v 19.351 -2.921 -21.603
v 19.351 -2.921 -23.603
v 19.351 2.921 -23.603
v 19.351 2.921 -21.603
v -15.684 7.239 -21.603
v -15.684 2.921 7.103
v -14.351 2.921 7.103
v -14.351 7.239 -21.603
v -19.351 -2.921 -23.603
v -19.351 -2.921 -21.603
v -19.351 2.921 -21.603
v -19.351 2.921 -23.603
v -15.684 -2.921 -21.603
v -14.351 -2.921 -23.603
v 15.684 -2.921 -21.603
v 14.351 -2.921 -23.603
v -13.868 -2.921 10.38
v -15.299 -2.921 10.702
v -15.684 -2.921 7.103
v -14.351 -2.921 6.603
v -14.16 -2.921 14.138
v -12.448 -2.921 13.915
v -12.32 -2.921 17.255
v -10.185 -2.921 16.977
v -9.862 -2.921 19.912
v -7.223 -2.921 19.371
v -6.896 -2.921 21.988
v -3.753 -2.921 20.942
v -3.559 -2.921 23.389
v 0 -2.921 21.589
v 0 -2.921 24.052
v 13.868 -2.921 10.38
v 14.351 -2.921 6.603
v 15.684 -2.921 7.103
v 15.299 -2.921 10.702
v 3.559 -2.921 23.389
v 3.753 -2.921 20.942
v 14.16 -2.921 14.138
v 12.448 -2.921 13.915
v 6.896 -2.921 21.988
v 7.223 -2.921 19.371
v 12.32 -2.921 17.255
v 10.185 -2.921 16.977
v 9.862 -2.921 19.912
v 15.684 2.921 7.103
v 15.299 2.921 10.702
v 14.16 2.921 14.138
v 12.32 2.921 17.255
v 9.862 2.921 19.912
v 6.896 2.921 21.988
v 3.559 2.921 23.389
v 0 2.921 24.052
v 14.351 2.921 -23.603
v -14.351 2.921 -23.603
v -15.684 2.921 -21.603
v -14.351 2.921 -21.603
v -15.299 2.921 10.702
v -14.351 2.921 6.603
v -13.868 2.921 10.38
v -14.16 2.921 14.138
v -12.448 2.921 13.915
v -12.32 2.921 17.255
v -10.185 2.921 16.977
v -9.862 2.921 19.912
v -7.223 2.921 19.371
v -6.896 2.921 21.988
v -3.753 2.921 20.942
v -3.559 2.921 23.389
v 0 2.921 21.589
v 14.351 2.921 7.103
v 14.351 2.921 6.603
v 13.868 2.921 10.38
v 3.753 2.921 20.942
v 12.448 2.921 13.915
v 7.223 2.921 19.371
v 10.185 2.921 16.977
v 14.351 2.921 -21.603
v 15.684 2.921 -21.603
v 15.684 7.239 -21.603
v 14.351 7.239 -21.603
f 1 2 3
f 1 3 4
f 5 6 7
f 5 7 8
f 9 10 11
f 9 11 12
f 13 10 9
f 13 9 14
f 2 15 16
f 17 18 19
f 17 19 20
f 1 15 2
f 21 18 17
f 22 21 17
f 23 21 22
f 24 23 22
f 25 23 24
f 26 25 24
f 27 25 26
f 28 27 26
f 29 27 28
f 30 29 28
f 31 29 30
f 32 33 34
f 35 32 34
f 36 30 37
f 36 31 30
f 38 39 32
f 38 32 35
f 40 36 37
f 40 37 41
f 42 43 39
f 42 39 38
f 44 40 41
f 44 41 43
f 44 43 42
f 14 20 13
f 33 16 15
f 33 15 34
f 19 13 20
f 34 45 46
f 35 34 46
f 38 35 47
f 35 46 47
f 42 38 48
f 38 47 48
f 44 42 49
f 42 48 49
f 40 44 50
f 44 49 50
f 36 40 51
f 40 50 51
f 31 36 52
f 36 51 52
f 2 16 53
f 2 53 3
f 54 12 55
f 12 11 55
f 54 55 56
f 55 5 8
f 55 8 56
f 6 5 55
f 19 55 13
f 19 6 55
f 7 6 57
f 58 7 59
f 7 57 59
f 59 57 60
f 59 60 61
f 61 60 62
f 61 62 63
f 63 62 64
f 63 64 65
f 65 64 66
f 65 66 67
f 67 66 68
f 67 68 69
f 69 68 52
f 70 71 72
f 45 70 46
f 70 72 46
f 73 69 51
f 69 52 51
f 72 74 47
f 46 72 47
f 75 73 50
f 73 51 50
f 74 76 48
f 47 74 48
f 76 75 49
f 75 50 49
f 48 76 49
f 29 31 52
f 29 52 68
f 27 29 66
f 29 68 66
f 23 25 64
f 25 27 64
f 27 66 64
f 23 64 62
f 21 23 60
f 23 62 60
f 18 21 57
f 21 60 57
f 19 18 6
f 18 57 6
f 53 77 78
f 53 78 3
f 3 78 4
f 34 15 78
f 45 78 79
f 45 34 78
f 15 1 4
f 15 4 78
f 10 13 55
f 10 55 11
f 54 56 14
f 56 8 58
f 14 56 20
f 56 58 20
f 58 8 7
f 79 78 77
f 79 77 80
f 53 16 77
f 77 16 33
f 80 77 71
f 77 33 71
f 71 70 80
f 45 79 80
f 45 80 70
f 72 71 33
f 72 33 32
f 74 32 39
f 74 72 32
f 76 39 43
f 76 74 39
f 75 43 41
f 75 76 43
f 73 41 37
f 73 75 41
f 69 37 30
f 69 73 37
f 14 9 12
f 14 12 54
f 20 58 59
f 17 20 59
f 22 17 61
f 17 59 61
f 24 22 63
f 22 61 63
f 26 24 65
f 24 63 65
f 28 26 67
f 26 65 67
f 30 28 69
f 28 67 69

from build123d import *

# Parameters (mm, degrees)
F1_DEPTH    = 2.921
F3_DEPTH    = 5.842
F4_T1_DEPTH = 5.842
F5_T1_DEPTH = 90.842
F7_DEPTH    = 1.3335
F9_DEPTH    = 1.3335


# Not quite as in the source:
# - a fillet or chamfer that OpenCascade refuses, or shapes differently, is made with other operations: its cross-section is extruded or revolved along the edge and cut away or added


with BuildPart() as f1:
    # F0 (on Front) → F1 (new body, symmetric)
    with BuildSketch(Plane.XZ):
        Polygon((-14.351, -21.6027), (-14.351, 21.6027), (14.351, 21.6027), (14.351, -21.6027), (15.6845, -21.6027), (15.6845, 24.1027), (-15.6845, 24.1027), (-15.6845, -21.6027), align=None)
    extrude(amount=F1_DEPTH, both=True)

    # F2 (on face) → F3 (join, through all)
    with BuildSketch(Plane.XZ.offset(2.921)):
        Polygon((-14.351, -23.6027), (-14.351, -21.6027), (-15.6845, -21.6027), (-19.351, -21.6027), (-19.351, -23.6027), align=None)
        Polygon((15.6845, -21.6027), (14.351, -21.6027), (14.351, -23.6027), (19.351, -23.6027), (19.351, -21.6027), align=None)
    extrude(amount=-F3_DEPTH)

    # F4: fillet of radius 15 on 2 edges, made by hand

    # F4_s2 → F4_t1 (join)
    with BuildSketch(Plane.XZ.offset(-2.921)):
        with BuildLine():
            ThreePointArc((-14.351, 6.6027), (-9.9576017178, 17.2093017178), (0.649, 21.6027))
            Line((0.649, 21.6027), (-14.351, 21.6027))
            Line((-14.351, 21.6027), (-14.351, 6.6027))
        make_face()
        with BuildLine():
            ThreePointArc((14.351, 6.6027), (9.9576017178, 17.2093017178), (-0.649, 21.6027))
            Line((-0.649, 21.6027), (14.351, 21.6027))
            Line((14.351, 21.6027), (14.351, 6.6027))
        make_face()
    extrude(amount=F4_T1_DEPTH)

    # F5: fillet of radius 17 on 2 edges, made by hand

    # F5_s2 → F5_t1 (cut)
    with BuildSketch(Plane.XZ.offset(-45.421)):
        with BuildLine():
            ThreePointArc((1.3155, 24.1027), (-10.7053152802, 19.1235152802), (-15.6845, 7.1027))
            Line((-15.6845, 7.1027), (-15.6845, 24.1027))
            Line((-15.6845, 24.1027), (1.3155, 24.1027))
        make_face()
        with BuildLine():
            ThreePointArc((15.6845, 7.1027), (10.7053152802, 19.1235152802), (-1.3155, 24.1027))
            Line((-1.3155, 24.1027), (15.6845, 24.1027))
            Line((15.6845, 24.1027), (15.6845, 7.1027))
        make_face()
    extrude(amount=F5_T1_DEPTH, mode=Mode.SUBTRACT)

    # F6 (on face) → F7 (join, through all)
    with BuildSketch(Plane(origin=(-15.6845, 0, 0), x_dir=(0, -1, 0), z_dir=(-1, 0, 0))):
        Polygon((-2.921, -21.6027), (-2.921, 7.1027), (-7.239, -21.6027), align=None)
    extrude(amount=-F7_DEPTH)

    # F8 (on face) → F9 (join, through all)
    with BuildSketch(Plane.YZ.offset(15.6845)):
        Polygon((2.921, 6.6027), (2.921, -21.6027), (7.239, -21.6027), (2.921, 7.1027), align=None)
    extrude(amount=-F9_DEPTH)


solid = f1.part
